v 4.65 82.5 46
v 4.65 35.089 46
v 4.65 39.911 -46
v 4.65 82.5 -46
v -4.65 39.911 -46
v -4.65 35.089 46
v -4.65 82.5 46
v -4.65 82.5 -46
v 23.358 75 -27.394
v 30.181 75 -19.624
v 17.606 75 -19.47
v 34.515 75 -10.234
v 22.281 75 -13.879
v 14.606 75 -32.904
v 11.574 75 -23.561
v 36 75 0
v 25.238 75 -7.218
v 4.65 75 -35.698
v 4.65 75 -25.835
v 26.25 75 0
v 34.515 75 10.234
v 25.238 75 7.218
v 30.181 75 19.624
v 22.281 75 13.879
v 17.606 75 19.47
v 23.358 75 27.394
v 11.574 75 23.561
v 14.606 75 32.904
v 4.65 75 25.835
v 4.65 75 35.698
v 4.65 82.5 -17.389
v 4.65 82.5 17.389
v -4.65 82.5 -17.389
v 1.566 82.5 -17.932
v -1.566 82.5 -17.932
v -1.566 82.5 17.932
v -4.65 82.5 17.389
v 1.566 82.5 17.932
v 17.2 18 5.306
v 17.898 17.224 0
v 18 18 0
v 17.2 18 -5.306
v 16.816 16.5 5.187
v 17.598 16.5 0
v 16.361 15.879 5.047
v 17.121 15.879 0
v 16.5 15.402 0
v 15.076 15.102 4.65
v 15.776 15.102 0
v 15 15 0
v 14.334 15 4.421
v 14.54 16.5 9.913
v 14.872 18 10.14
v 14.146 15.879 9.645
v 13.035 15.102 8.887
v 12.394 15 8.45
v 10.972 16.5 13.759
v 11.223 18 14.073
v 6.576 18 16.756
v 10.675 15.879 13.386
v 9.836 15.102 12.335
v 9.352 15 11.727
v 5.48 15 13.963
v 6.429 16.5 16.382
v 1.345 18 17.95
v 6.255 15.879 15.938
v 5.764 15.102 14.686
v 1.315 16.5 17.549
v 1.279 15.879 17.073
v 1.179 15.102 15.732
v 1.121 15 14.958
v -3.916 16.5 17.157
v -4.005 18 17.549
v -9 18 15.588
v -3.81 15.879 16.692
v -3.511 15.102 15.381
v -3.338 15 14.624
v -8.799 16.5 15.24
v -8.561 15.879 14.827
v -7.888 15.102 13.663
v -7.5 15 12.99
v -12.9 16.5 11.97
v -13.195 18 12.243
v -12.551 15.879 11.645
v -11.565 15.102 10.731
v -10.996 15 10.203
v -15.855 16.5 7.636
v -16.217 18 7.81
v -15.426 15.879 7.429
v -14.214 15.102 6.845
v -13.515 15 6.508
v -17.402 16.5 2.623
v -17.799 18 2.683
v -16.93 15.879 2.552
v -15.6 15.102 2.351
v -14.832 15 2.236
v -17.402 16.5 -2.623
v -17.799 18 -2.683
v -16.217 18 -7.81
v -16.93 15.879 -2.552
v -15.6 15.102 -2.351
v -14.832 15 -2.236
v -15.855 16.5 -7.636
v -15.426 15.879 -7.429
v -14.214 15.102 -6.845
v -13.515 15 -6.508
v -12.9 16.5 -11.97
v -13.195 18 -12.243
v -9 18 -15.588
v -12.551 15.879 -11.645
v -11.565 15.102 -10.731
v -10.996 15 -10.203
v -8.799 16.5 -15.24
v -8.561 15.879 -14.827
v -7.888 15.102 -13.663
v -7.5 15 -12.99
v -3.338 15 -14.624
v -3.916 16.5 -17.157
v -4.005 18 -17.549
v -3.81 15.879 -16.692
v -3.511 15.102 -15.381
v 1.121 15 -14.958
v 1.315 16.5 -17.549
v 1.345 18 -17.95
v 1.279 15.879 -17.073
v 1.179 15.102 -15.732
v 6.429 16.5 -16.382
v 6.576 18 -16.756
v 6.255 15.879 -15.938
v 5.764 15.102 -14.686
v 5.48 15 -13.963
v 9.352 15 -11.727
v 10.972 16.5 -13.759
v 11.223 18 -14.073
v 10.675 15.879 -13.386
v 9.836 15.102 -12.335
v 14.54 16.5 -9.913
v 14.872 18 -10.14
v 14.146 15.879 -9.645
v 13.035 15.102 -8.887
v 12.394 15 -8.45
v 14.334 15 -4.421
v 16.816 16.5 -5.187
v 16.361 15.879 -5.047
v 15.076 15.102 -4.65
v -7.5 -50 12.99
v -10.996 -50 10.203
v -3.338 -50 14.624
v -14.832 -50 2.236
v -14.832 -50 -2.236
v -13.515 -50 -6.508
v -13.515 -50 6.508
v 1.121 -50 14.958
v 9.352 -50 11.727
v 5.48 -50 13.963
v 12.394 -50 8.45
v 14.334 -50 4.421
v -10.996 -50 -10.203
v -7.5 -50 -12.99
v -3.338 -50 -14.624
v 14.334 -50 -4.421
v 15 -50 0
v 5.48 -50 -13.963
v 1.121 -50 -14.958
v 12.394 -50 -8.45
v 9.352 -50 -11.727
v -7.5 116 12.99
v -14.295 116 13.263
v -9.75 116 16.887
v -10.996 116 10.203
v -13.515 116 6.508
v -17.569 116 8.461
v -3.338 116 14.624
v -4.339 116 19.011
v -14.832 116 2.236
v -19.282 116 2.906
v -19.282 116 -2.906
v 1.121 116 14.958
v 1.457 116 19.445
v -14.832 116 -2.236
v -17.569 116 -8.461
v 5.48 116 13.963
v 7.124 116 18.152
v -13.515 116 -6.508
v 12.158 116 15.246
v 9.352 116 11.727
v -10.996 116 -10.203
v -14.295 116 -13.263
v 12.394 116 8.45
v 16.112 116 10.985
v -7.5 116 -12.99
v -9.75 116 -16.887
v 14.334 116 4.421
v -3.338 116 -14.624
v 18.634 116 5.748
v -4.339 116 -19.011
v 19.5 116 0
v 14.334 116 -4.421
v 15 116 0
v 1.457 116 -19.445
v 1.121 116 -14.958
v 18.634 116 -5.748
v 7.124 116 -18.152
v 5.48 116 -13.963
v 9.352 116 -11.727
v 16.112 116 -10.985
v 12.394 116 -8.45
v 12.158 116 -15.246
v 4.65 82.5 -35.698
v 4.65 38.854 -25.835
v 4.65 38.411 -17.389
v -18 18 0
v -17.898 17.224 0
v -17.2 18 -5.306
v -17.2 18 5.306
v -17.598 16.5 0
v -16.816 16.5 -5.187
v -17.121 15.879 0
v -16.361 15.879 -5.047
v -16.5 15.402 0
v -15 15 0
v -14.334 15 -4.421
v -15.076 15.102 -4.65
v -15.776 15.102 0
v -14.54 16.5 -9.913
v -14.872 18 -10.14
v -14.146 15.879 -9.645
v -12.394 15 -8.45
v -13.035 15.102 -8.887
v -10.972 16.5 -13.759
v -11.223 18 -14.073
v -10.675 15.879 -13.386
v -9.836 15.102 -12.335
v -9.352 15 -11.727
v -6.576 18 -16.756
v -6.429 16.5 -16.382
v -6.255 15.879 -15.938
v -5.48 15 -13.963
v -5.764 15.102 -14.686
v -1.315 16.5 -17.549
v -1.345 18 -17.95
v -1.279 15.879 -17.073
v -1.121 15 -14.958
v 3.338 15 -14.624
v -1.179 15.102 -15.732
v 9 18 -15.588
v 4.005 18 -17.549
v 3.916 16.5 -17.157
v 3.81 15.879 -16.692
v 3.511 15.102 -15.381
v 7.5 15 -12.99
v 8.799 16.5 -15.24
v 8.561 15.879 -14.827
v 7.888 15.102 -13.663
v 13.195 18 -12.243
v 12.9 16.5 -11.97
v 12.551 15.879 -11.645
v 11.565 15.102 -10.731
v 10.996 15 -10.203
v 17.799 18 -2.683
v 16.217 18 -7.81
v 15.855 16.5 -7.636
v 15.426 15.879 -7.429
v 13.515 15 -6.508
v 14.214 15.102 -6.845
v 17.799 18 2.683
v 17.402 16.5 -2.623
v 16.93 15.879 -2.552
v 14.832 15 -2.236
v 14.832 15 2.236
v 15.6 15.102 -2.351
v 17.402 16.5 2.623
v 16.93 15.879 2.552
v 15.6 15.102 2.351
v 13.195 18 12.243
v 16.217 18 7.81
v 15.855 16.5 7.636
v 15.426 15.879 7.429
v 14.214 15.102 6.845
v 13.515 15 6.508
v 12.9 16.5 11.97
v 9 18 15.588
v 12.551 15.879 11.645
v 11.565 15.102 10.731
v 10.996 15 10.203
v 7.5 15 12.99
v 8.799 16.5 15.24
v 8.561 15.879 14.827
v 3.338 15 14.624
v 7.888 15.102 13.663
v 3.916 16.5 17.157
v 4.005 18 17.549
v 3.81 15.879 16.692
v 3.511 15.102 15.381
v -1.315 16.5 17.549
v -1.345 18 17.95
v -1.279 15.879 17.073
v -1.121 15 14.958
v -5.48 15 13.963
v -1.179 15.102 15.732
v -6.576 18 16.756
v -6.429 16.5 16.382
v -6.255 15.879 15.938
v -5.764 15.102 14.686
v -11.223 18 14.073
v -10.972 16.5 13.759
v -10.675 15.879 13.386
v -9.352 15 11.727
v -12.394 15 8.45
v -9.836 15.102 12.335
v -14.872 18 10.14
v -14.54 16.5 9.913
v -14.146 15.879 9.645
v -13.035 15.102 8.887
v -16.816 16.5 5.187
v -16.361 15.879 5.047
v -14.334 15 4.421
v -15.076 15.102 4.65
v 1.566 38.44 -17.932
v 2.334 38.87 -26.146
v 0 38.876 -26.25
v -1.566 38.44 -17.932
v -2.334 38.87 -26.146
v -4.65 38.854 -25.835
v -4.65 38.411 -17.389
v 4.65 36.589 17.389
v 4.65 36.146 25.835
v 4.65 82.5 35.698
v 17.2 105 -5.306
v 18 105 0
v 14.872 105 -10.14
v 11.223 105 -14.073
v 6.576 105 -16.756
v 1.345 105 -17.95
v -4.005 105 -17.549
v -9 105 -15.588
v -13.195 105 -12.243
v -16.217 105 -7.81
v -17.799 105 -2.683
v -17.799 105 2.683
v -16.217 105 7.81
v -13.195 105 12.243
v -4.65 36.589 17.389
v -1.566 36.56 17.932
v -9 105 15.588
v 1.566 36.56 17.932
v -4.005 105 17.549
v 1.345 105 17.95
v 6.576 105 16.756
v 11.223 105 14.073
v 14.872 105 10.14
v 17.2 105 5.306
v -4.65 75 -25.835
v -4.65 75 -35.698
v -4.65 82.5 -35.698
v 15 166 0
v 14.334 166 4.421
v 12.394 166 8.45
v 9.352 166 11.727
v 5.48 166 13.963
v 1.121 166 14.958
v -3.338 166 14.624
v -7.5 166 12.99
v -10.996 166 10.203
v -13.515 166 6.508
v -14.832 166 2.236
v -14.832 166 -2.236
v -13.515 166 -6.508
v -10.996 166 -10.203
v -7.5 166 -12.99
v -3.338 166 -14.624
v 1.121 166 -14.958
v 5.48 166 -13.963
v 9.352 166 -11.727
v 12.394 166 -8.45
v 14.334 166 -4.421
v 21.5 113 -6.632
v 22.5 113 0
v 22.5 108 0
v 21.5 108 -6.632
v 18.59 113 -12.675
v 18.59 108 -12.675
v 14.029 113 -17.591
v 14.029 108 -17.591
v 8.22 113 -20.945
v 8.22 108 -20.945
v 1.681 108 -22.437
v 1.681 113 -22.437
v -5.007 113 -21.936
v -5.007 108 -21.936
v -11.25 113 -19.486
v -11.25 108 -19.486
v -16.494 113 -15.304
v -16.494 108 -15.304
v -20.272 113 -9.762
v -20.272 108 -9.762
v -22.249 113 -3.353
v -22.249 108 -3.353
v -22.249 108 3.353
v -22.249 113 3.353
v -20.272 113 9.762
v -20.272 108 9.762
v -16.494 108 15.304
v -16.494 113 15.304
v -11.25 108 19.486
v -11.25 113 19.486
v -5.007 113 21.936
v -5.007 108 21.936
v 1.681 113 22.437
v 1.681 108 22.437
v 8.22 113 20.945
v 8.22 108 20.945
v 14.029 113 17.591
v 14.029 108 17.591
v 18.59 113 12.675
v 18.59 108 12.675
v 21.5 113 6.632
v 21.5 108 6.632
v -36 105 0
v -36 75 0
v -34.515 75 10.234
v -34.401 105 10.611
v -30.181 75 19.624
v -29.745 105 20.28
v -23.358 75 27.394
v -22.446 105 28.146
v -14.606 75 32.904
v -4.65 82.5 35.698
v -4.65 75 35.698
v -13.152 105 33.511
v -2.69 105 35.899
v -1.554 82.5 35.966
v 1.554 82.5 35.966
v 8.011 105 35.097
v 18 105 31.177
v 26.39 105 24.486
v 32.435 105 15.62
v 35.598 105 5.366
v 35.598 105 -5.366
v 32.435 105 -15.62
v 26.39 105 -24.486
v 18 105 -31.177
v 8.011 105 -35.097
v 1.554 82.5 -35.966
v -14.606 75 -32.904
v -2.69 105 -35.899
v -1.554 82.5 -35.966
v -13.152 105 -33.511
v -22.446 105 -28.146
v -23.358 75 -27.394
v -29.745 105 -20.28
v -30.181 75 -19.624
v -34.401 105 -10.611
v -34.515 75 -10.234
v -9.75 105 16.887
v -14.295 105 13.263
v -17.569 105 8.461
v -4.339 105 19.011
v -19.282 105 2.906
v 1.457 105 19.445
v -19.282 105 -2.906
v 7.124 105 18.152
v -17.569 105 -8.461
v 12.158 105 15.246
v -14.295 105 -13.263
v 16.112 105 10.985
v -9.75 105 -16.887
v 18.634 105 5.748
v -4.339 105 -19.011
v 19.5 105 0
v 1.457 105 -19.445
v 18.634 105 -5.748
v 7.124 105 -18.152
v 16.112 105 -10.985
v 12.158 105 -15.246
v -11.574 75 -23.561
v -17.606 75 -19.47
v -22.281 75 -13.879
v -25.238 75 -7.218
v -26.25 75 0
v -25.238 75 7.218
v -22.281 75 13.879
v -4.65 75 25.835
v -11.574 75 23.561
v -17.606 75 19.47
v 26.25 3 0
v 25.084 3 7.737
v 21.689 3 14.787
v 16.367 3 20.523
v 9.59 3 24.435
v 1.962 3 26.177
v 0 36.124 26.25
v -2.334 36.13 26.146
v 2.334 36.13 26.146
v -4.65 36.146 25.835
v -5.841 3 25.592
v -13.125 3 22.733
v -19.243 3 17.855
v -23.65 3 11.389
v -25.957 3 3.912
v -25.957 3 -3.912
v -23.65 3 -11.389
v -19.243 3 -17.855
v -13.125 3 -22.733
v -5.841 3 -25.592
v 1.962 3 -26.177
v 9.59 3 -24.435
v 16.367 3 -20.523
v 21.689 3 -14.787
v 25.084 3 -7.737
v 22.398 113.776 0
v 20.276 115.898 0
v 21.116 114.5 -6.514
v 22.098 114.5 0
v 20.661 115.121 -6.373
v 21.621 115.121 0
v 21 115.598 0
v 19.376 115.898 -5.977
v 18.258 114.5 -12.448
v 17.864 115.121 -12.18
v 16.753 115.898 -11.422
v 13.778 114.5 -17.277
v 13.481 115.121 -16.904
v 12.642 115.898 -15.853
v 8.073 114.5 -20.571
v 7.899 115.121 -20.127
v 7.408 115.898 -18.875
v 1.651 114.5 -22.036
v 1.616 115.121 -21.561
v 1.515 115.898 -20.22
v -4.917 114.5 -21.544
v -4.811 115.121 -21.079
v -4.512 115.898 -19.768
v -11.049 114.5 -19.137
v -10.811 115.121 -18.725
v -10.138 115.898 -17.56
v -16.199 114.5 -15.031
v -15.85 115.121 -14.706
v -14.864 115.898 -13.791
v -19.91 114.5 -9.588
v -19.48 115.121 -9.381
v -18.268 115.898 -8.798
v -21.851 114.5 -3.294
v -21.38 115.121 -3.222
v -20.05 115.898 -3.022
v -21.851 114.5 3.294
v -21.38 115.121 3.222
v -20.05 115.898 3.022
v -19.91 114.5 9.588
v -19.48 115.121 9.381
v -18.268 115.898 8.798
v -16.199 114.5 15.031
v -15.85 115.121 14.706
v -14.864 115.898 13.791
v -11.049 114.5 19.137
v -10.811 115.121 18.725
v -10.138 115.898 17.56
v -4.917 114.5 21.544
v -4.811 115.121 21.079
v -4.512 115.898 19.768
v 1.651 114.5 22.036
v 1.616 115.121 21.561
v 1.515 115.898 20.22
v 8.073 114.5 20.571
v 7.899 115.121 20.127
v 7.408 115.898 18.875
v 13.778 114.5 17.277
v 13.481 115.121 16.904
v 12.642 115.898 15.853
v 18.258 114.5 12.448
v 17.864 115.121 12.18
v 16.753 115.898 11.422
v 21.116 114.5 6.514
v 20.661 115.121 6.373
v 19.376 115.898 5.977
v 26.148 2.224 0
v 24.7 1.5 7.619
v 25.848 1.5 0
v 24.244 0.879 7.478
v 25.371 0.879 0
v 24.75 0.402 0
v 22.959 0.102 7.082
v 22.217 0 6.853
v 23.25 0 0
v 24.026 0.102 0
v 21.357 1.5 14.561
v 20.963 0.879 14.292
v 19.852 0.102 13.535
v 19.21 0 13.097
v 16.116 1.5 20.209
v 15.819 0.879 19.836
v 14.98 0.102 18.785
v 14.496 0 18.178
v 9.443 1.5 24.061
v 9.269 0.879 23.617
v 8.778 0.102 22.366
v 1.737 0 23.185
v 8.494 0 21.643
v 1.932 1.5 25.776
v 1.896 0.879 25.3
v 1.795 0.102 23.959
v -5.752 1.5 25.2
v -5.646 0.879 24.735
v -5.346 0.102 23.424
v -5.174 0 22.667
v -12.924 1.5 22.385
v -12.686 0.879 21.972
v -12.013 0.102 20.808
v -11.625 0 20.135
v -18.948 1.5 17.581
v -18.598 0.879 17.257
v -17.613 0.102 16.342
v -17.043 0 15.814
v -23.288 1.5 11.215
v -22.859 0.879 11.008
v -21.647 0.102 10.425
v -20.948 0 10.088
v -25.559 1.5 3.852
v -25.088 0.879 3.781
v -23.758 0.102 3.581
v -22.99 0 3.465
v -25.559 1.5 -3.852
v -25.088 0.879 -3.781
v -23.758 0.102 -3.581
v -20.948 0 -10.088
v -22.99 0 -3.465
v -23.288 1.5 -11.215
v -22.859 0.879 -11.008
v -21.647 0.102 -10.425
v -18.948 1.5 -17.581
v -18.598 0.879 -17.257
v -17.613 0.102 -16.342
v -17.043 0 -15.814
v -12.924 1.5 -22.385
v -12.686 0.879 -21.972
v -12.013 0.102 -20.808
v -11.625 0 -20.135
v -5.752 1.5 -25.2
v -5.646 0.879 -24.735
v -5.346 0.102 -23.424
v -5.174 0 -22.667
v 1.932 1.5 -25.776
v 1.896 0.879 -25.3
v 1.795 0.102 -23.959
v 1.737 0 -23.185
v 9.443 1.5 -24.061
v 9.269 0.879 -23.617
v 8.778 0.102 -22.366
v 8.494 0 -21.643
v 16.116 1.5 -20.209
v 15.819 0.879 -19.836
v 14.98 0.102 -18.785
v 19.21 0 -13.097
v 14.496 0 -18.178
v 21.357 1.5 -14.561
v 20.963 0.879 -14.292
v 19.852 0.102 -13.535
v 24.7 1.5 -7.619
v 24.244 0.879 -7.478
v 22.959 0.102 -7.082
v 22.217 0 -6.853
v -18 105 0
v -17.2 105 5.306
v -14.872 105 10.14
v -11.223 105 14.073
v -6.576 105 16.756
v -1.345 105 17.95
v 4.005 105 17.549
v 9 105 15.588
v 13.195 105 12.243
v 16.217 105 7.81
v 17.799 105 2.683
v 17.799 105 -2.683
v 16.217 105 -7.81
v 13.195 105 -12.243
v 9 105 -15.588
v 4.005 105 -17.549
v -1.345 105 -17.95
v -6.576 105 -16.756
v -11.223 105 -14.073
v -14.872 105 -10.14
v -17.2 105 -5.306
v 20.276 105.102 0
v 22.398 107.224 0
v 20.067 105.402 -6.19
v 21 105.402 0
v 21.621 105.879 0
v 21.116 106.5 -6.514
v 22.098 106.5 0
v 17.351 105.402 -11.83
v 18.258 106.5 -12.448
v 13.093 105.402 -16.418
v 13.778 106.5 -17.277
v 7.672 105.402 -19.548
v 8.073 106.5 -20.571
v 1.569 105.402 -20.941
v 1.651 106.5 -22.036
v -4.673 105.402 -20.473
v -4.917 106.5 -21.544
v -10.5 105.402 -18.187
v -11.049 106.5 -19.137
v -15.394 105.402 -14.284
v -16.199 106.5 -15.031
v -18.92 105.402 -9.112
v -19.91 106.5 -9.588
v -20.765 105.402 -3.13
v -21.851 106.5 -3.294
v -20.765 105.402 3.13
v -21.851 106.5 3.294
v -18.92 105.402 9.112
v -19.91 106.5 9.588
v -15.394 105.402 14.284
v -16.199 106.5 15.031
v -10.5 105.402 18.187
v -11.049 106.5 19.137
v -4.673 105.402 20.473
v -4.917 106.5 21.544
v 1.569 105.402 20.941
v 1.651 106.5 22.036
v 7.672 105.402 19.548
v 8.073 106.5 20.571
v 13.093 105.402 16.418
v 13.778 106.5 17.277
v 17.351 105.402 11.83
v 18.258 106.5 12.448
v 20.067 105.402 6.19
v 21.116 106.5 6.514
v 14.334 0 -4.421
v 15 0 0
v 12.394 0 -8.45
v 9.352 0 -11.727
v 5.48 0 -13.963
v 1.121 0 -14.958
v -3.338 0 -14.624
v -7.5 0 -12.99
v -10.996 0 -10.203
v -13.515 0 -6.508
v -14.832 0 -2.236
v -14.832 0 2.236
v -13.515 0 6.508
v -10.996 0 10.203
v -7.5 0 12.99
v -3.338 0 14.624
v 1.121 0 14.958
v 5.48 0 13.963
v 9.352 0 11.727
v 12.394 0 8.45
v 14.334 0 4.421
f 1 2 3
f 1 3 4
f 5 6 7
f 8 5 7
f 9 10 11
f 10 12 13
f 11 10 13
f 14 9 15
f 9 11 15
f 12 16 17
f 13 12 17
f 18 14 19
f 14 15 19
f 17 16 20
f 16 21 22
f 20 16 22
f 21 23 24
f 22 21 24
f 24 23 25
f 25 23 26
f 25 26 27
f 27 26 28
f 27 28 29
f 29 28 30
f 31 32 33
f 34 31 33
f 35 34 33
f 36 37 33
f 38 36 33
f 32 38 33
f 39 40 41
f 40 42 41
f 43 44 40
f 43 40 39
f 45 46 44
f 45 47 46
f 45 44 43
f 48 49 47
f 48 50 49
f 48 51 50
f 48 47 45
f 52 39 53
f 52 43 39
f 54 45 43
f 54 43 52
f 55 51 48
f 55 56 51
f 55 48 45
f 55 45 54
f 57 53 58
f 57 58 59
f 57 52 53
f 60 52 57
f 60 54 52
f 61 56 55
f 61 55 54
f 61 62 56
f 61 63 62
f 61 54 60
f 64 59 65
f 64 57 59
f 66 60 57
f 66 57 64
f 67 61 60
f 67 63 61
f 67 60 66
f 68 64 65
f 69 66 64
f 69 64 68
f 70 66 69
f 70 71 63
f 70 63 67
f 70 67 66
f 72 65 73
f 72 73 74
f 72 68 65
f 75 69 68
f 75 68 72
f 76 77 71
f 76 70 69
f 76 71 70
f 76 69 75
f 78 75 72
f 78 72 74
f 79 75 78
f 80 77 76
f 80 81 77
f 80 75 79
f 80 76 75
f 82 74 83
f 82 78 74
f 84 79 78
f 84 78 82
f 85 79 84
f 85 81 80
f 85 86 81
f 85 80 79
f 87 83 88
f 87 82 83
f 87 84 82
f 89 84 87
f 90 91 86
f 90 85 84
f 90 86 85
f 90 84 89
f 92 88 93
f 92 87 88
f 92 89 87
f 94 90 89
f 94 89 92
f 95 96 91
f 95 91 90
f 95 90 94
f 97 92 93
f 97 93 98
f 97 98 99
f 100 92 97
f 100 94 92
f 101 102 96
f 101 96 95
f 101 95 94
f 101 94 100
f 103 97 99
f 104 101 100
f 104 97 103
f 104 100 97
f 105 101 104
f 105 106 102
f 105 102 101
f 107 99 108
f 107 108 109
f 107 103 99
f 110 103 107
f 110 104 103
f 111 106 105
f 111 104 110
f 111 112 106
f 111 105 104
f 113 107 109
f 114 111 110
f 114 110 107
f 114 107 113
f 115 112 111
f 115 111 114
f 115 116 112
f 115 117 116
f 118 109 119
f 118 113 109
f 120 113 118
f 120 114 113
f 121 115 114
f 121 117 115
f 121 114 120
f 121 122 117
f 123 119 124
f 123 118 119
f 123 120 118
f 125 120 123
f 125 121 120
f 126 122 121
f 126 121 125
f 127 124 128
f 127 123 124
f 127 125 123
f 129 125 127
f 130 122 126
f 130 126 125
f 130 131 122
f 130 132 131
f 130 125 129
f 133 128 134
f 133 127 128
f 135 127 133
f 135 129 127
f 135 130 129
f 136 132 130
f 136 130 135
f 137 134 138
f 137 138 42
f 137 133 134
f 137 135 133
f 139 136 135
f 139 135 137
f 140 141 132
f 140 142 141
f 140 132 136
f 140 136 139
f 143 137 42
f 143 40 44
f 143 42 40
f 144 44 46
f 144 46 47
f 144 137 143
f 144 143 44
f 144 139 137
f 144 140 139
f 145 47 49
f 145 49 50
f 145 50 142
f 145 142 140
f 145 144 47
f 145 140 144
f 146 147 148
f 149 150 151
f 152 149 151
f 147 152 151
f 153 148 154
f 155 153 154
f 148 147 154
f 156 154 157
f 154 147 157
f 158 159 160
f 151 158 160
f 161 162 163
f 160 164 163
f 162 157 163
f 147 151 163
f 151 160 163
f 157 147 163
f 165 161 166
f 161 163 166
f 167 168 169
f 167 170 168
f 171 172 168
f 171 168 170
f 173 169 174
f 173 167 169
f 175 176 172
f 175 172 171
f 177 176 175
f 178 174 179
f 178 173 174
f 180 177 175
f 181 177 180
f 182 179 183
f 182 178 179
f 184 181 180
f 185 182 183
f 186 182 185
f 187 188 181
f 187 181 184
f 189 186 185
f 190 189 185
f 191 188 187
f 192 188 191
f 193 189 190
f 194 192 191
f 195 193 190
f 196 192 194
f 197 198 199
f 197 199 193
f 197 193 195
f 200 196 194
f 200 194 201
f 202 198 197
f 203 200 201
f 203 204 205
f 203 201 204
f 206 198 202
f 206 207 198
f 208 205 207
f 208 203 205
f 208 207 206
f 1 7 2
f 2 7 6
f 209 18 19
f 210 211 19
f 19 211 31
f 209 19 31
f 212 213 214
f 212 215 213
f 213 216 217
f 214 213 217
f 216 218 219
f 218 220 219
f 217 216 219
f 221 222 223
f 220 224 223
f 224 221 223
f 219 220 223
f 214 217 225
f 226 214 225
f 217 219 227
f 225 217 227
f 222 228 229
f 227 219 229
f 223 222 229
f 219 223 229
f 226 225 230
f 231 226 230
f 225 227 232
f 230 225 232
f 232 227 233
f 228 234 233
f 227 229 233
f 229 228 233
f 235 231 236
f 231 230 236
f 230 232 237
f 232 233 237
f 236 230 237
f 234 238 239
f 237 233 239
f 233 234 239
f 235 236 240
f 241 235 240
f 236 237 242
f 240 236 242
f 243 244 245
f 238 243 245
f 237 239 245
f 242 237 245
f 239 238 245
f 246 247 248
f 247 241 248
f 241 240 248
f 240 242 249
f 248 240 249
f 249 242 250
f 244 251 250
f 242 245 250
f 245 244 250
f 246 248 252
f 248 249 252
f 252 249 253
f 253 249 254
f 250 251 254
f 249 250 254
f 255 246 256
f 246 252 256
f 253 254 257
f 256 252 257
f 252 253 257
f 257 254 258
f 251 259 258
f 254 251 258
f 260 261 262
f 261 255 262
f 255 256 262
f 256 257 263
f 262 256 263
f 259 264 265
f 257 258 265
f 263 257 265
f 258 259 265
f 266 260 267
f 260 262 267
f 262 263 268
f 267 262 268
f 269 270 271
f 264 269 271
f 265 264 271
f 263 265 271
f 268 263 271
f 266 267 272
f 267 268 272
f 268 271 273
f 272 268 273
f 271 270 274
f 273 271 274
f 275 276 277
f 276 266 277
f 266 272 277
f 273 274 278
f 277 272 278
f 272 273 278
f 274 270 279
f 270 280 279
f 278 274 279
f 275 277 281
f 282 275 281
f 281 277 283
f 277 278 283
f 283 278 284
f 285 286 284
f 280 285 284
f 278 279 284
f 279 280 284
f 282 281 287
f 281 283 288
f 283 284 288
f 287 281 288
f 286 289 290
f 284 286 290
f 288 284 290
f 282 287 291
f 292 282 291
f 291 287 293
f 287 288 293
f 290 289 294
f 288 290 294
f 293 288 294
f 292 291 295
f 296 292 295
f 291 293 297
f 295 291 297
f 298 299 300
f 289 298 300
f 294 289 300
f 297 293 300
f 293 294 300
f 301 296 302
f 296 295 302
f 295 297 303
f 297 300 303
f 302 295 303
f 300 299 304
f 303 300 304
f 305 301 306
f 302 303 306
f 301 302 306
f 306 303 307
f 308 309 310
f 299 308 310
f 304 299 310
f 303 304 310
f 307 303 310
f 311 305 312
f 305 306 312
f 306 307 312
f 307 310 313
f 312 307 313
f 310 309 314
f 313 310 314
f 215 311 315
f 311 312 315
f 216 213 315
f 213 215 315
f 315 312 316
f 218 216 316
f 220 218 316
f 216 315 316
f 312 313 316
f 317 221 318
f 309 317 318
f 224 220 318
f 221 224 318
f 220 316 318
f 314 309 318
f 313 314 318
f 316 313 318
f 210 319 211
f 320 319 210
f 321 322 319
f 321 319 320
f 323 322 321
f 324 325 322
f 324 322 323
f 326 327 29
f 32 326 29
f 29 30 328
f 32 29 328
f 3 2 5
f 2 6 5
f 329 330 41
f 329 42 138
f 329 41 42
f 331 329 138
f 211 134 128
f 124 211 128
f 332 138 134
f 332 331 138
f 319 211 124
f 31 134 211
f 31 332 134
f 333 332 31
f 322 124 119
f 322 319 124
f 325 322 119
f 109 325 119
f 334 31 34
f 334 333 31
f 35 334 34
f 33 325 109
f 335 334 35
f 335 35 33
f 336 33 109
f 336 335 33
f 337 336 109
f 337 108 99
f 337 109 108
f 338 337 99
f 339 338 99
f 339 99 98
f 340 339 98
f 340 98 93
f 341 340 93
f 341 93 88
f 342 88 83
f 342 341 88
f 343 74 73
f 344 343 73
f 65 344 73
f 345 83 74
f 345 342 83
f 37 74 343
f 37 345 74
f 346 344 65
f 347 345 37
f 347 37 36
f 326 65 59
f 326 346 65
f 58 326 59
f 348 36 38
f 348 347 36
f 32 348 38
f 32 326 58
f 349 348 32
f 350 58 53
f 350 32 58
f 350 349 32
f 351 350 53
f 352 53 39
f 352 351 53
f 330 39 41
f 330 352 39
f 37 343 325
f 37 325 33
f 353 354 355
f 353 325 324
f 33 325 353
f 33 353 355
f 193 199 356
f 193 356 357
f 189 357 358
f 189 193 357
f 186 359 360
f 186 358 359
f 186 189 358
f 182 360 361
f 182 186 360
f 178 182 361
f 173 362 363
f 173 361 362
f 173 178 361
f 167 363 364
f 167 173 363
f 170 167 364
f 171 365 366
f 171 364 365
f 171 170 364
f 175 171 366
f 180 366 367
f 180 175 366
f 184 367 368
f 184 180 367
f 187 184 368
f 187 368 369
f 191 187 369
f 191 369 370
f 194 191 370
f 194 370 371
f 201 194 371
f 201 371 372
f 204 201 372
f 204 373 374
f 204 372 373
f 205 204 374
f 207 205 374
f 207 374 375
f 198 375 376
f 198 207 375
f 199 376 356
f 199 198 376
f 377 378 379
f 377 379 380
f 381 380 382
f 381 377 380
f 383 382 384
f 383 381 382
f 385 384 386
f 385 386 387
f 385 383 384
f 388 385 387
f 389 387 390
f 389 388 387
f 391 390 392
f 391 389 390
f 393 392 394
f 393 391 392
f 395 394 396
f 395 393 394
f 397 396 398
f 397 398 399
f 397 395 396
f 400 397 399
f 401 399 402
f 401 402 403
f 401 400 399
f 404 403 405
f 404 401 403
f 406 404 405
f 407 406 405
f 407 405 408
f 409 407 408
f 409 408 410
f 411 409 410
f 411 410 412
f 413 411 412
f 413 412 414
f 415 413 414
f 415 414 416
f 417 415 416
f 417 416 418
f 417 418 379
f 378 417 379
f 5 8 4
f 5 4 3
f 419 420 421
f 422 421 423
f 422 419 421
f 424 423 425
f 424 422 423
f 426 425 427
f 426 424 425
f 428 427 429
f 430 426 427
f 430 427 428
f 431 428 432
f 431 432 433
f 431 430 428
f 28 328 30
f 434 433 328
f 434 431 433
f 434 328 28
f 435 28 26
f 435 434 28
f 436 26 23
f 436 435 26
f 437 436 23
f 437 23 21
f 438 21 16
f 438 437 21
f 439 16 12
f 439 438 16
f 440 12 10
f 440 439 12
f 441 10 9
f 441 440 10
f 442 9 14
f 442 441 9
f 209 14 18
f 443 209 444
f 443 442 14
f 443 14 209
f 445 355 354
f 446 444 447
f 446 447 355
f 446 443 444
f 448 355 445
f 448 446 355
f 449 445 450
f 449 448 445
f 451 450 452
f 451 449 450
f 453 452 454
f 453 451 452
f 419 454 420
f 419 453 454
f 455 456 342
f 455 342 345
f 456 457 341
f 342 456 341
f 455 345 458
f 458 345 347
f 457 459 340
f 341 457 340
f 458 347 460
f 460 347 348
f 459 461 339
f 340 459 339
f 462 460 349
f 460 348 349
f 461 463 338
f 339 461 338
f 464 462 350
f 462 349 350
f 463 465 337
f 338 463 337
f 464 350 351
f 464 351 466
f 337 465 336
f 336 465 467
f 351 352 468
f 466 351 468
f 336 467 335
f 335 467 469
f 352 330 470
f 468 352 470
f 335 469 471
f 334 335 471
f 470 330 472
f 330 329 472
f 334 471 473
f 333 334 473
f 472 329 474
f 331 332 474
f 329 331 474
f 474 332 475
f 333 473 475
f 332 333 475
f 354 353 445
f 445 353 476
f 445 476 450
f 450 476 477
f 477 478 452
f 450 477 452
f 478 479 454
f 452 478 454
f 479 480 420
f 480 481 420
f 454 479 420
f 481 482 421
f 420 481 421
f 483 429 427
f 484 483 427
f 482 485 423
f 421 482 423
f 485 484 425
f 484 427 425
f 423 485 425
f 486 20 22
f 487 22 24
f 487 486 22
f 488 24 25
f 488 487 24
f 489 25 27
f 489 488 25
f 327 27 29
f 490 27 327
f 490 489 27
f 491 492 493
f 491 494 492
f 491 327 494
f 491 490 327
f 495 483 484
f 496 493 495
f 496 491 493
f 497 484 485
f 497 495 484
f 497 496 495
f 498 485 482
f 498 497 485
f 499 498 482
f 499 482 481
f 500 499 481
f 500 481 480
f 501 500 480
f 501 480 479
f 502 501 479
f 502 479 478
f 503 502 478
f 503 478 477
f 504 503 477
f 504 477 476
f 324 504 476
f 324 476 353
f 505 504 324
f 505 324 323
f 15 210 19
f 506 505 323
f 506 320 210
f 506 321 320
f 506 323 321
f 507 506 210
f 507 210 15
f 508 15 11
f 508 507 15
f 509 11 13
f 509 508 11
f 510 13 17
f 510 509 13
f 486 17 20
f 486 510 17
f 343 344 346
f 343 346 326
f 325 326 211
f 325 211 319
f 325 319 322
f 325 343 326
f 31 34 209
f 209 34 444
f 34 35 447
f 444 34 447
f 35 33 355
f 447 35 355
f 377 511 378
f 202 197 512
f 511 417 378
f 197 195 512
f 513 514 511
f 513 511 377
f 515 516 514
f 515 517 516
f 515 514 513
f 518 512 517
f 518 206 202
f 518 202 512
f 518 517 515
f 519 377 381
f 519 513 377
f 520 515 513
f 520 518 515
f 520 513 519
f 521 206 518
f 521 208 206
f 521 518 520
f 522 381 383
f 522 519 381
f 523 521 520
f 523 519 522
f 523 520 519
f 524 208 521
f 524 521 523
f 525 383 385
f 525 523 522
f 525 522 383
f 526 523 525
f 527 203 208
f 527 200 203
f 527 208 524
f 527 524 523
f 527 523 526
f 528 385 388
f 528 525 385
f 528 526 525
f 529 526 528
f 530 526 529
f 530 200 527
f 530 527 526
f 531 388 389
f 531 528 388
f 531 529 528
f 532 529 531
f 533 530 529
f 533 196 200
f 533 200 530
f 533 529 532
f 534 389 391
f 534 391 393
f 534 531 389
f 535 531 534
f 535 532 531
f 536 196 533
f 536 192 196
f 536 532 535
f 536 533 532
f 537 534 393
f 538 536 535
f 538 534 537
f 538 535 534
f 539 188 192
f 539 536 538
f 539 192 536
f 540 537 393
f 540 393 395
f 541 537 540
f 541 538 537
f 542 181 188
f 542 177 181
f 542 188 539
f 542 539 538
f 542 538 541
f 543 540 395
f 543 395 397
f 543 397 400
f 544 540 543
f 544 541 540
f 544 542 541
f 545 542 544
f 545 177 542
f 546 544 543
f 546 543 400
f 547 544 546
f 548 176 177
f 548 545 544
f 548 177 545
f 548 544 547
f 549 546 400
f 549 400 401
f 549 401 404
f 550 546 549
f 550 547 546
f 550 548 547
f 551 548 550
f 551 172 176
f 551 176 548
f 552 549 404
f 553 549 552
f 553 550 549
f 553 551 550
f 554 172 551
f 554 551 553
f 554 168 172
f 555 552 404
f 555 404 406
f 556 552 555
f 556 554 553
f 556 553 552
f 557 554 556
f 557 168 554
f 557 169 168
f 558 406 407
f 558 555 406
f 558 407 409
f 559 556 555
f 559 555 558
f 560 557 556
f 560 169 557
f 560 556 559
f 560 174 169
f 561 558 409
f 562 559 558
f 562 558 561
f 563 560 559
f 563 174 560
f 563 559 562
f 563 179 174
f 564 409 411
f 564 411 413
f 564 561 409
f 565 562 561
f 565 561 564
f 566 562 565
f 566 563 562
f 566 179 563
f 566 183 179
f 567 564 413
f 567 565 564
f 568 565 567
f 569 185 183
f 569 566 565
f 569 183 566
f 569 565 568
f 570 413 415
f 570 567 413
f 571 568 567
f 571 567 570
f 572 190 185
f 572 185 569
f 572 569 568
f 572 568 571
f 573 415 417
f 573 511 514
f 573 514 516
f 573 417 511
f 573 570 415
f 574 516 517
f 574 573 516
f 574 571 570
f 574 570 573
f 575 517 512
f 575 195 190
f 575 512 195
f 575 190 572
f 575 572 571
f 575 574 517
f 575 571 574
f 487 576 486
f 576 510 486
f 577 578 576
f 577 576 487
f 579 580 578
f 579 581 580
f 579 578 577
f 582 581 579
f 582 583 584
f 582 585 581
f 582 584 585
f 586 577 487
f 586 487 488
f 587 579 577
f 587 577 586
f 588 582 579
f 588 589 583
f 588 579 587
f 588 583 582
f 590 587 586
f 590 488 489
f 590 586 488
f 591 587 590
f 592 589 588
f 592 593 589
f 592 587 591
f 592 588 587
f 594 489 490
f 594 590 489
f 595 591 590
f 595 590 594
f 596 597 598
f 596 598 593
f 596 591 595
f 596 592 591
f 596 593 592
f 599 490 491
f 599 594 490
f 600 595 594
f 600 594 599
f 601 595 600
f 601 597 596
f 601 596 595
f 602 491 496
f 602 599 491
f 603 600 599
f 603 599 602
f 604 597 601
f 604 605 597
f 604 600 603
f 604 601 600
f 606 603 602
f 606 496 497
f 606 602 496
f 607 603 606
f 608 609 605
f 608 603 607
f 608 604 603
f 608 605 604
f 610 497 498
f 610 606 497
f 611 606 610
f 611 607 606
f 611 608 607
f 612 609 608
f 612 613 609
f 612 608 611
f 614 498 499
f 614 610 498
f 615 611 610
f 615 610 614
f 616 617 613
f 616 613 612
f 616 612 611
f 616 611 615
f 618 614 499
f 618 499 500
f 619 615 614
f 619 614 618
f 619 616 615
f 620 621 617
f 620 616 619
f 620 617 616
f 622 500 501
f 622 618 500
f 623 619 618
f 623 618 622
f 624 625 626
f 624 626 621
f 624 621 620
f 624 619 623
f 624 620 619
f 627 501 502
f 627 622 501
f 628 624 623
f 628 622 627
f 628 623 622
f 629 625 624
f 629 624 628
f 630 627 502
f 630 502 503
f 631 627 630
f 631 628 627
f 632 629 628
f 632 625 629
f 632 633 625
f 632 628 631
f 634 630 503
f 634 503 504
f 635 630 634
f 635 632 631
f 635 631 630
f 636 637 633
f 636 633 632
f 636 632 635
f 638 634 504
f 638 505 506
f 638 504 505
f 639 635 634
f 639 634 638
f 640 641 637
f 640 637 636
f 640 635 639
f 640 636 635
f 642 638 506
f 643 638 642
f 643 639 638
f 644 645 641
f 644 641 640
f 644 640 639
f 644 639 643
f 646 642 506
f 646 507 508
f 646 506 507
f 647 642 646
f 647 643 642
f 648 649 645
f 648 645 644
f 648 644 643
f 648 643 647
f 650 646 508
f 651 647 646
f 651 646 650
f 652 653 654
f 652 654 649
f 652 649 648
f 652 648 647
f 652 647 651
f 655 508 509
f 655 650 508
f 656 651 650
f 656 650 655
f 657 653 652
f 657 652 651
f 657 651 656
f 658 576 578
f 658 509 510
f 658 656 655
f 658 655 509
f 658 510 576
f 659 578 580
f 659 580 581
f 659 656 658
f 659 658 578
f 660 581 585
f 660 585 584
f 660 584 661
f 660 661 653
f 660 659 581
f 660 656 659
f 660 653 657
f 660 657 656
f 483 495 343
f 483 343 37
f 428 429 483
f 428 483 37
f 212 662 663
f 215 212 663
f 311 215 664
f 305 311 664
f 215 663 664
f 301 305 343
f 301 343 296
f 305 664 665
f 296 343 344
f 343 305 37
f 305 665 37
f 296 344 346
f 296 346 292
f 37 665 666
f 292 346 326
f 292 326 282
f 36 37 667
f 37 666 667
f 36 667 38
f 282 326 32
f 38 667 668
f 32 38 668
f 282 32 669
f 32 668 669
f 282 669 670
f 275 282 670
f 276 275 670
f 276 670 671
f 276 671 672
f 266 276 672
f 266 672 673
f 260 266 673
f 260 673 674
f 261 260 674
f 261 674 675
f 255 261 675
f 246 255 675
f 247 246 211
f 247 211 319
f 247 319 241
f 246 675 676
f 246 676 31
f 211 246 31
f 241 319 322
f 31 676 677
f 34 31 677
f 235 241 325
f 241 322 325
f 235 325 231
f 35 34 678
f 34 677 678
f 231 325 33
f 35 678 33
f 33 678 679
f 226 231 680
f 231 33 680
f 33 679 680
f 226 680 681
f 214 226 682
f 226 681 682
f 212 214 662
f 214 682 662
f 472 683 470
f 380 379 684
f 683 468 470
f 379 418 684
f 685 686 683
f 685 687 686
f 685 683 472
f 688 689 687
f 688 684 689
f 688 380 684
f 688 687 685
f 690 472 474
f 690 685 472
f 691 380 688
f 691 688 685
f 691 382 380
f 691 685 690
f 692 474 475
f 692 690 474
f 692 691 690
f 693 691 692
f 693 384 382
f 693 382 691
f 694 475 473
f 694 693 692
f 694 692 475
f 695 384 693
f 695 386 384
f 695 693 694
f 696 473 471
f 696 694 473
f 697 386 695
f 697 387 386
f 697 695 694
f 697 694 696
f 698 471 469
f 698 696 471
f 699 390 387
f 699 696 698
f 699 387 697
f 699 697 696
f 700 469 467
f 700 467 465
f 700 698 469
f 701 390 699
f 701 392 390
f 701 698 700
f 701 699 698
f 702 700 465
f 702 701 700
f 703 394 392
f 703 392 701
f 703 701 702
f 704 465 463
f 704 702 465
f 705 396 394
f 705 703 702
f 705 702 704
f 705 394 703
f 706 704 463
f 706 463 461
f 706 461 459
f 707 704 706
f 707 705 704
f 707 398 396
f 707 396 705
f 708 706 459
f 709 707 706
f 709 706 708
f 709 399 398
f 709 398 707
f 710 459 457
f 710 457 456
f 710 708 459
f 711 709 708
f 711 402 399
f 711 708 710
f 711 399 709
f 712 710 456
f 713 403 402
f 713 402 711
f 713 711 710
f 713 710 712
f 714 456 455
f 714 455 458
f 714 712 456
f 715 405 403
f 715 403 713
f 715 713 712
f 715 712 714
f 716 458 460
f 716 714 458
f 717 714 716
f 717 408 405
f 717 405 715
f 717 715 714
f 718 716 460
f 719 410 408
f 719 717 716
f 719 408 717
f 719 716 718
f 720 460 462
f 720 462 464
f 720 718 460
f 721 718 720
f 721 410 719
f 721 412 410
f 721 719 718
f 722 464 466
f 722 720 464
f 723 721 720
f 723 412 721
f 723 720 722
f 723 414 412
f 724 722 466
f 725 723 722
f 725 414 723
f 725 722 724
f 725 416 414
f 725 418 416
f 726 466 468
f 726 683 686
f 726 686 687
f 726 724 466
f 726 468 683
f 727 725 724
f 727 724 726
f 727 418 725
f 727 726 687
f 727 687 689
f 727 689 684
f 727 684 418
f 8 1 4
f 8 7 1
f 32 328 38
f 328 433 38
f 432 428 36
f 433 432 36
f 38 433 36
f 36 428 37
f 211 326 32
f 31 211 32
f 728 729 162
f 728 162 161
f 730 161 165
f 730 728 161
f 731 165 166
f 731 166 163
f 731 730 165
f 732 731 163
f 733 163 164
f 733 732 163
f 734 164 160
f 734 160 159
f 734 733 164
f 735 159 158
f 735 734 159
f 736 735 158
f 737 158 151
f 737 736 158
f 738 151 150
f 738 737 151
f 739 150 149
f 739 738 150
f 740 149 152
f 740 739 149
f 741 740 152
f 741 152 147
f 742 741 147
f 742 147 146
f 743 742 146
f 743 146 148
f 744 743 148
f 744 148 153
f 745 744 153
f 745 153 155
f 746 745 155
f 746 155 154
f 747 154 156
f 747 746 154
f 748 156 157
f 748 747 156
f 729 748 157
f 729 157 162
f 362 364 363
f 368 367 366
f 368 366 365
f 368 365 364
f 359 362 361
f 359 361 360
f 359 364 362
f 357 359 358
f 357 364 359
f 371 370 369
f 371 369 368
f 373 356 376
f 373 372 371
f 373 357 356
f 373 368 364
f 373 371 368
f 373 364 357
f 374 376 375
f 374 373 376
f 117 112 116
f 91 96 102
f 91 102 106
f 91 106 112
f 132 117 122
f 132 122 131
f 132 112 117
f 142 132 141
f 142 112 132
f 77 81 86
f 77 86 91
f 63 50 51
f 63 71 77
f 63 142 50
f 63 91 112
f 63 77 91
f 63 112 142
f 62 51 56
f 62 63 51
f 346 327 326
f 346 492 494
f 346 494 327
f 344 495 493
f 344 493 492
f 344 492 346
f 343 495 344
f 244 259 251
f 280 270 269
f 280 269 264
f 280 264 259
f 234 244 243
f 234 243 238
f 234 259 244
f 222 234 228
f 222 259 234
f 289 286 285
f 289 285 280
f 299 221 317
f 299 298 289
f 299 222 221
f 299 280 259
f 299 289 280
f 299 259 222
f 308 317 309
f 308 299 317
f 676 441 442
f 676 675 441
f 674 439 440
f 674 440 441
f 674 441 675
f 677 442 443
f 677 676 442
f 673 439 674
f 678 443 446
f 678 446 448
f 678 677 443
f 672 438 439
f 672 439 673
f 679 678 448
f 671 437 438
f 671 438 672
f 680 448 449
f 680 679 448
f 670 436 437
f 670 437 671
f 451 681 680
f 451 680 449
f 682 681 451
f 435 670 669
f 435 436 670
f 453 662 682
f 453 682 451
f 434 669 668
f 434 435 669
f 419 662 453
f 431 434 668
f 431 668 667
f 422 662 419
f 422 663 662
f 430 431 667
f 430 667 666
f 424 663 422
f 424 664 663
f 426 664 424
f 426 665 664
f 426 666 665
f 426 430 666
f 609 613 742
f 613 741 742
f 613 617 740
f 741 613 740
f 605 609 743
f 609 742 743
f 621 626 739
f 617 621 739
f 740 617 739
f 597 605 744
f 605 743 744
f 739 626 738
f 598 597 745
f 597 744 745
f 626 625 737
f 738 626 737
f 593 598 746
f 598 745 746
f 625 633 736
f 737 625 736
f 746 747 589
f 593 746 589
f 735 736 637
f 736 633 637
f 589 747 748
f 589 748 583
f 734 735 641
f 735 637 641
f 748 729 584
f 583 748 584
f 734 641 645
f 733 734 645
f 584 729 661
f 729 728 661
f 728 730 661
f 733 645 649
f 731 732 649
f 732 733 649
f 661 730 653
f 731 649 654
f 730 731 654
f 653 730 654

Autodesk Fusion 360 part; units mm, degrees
sketch "Sketch1" plane through (0, 0, 0) normal (0, 1, 0) x (1, 0, 0)
  circle A0 centre (0, 0) radius 15
  circle A1 centre (0, 0) radius 22.5
  dimension "d1" = 30
  dimension "d4" = 45
extrude "Extrude1" add sketch "Sketch1" along normal blind 50 contours A0 makes body 1
extrude "Extrude2" add sketch "Sketch1" against normal blind 11 separate body contours A0 | A1 makes body 2
sketch "Sketch2" plane through (0, -11, 0) normal (0, -1, 0) x (1, 0, 0)
  circle A0 centre (0, 0) radius 22.5
  circle A1 centre (0, 0) radius 18
  dimension "d7" = 36
extrude "Extrude3" add sketch "Sketch2" along normal blind 90 contours A1 bodies 2
combine "Combine1" operation add target body 1 tool bodies 2
copy_body "Body->Comp1" bodies 1 removing the originals makes body 3 in component "spigot"
sketch "Sketch3" plane through (0, 0, 0) normal (0, 1, 0) x (1, 0, 0)
  circle A0 centre (0, 0) radius 15
  circle A1 centre (0, 0) radius 26.25
  dimension "d11" = 30
  dimension "d14" = 52.5
extrude "Extrude4" add sketch "Sketch3" against normal blind 50 separate body contours A0 makes body 4
extrude "Extrude5" add sketch "Sketch3" along normal blind 105 contours A0 | A1 bodies 4
sketch "Sketch4" plane through (0, 105, 0) normal (0, 1, 0) x (-1, 0, 0)
  circle A0 centre (0, 0) radius 26.25
  circle A1 centre (0, 0) radius 36
  dimension "d17" = 72
extrude "Extrude6" add sketch "Sketch4" against normal blind 30 bodies 4
sketch "Sketch5" plane through (0, 105, 0) normal (0, 1, 0) x (-1, 0, 0)
  circle A0 centre (0, 0) radius 36
  circle A1 centre (0, 0) radius 18
  dimension "d20" = 36
extrude "Extrude7" cut sketch "Sketch5" against normal blind 90 contours A1 bodies 4
fillet "Fillet1" radius 3 1 edges at (16.7819, 15, 6.5091) on bodies 4
fillet "Fillet1'" radius 3 1 edges at (-16.7819, -101, -6.5091) on bodies 3 in component "spigot"
fillet "Fillet2" radius 3 1 edges at (-24.4736, 0, 9.4924) on bodies 4
fillet "Fillet2'" radius 3 1 edges at (-20.9774, 0, 8.1363) on bodies 3 in component "spigot"
fillet "Fillet2'" radius 3 1 edges at (-20.9774, -11, -8.1363) on bodies 3 in component "spigot"
sketch "Sketch6" plane through (0, 0, 0) normal (1, 0, 0) x (0, 1, 0)
  line L0 (75, -33) -> (75, -29.25)
  line L1 (75, 29.25) -> (75, 33)
  line L2 (0, 18) -> (0, 23.25)
  line L3 (0, -23.25) -> (0, -18)
  line L4 (-50, 0) -> (-50, -15)
  line L5 (-50, 15) -> (-50, 0)
  line L6 (105, 33) -> (105, -33)
  arc A0 (75, -29.25) -> (72, -26.25) centre (72, -29.25) ccw
  arc A1 (72, 26.25) -> (75, 29.25) centre (72, 29.25) ccw
  line L7 (3, -26.25) -> (72, -26.25)
  line L8 (3, 26.25) -> (72, 26.25)
  arc A2 (-3, 15) -> (0, 18) centre (-3, 18) ccw
  arc A3 (0, -18) -> (-3, -15) centre (-3, -18) ccw
  line L9 (-3, 15) -> (-50, 15)
  line L10 (-3, -15) -> (-50, -15)
  arc A4 (75, -33) -> (78, -36) centre (78, -33) ccw
  arc A5 (78, 36) -> (75, 33) centre (78, 33) ccw
  line L11 (102, 36) -> (78, 36)
  line L12 (102, -36) -> (78, -36)
  arc A6 (105, 33) -> (102, 36) centre (102, 33) ccw
  arc A7 (102, -36) -> (105, -33) centre (102, -33) ccw
  arc A8 (3, 26.25) -> (0, 23.25) centre (3, 23.25) ccw
  arc A9 (0, -23.25) -> (3, -26.25) centre (3, -23.25) ccw
  line L13 (-50, 0) -> (109.5, 0) construction
  line L14 (82.5, 46) -> (82.5, -46)
  line L15 (82.5, 0) -> (37.5, 0)
  line L16 (37.5, 0) -> (35.0892, 46)
  line L17 (82.5, 46) -> (35.0892, 46)
  line L18 (82.5, -46) -> (39.9108, -46)
  line L19 (37.5, 0) -> (39.9108, -46)
  point P0 (82.5, -46)
  point P1 (82.5, 46)
  dimension "d41" = 22.5
  dimension "d42" = 45
  dimension "d43" = 93
  dimension "d44" = 92
extrude "Extrude8" add sketch "Sketch6" along normal mid plane 9.3 separate body contours L0 A0 L7 A4 L12 L14 L18 L19 | L0 A0 L7 A4 L12 L14 L15 L19 | L1 A1 L8 A5 L11 L14 L15 L16 | L1 A1 L8 A5 L11 L14 L16 L17 makes body 5
combine "Combine2" operation cut target body 4 tool bodies 5 keep tools
combine "Combine1'" operation cut target body 3 tool bodies 5 body 5 seen with x (1, 0, 0) y (0, 1, 0) z (0, 0, 1) at (0, -116, 0) keep tools in component "spigot"
component "spigot" placed x (1, 0, 0) y (0, 1, 0) z (0, 0, 1) at (0, 116, 0)
